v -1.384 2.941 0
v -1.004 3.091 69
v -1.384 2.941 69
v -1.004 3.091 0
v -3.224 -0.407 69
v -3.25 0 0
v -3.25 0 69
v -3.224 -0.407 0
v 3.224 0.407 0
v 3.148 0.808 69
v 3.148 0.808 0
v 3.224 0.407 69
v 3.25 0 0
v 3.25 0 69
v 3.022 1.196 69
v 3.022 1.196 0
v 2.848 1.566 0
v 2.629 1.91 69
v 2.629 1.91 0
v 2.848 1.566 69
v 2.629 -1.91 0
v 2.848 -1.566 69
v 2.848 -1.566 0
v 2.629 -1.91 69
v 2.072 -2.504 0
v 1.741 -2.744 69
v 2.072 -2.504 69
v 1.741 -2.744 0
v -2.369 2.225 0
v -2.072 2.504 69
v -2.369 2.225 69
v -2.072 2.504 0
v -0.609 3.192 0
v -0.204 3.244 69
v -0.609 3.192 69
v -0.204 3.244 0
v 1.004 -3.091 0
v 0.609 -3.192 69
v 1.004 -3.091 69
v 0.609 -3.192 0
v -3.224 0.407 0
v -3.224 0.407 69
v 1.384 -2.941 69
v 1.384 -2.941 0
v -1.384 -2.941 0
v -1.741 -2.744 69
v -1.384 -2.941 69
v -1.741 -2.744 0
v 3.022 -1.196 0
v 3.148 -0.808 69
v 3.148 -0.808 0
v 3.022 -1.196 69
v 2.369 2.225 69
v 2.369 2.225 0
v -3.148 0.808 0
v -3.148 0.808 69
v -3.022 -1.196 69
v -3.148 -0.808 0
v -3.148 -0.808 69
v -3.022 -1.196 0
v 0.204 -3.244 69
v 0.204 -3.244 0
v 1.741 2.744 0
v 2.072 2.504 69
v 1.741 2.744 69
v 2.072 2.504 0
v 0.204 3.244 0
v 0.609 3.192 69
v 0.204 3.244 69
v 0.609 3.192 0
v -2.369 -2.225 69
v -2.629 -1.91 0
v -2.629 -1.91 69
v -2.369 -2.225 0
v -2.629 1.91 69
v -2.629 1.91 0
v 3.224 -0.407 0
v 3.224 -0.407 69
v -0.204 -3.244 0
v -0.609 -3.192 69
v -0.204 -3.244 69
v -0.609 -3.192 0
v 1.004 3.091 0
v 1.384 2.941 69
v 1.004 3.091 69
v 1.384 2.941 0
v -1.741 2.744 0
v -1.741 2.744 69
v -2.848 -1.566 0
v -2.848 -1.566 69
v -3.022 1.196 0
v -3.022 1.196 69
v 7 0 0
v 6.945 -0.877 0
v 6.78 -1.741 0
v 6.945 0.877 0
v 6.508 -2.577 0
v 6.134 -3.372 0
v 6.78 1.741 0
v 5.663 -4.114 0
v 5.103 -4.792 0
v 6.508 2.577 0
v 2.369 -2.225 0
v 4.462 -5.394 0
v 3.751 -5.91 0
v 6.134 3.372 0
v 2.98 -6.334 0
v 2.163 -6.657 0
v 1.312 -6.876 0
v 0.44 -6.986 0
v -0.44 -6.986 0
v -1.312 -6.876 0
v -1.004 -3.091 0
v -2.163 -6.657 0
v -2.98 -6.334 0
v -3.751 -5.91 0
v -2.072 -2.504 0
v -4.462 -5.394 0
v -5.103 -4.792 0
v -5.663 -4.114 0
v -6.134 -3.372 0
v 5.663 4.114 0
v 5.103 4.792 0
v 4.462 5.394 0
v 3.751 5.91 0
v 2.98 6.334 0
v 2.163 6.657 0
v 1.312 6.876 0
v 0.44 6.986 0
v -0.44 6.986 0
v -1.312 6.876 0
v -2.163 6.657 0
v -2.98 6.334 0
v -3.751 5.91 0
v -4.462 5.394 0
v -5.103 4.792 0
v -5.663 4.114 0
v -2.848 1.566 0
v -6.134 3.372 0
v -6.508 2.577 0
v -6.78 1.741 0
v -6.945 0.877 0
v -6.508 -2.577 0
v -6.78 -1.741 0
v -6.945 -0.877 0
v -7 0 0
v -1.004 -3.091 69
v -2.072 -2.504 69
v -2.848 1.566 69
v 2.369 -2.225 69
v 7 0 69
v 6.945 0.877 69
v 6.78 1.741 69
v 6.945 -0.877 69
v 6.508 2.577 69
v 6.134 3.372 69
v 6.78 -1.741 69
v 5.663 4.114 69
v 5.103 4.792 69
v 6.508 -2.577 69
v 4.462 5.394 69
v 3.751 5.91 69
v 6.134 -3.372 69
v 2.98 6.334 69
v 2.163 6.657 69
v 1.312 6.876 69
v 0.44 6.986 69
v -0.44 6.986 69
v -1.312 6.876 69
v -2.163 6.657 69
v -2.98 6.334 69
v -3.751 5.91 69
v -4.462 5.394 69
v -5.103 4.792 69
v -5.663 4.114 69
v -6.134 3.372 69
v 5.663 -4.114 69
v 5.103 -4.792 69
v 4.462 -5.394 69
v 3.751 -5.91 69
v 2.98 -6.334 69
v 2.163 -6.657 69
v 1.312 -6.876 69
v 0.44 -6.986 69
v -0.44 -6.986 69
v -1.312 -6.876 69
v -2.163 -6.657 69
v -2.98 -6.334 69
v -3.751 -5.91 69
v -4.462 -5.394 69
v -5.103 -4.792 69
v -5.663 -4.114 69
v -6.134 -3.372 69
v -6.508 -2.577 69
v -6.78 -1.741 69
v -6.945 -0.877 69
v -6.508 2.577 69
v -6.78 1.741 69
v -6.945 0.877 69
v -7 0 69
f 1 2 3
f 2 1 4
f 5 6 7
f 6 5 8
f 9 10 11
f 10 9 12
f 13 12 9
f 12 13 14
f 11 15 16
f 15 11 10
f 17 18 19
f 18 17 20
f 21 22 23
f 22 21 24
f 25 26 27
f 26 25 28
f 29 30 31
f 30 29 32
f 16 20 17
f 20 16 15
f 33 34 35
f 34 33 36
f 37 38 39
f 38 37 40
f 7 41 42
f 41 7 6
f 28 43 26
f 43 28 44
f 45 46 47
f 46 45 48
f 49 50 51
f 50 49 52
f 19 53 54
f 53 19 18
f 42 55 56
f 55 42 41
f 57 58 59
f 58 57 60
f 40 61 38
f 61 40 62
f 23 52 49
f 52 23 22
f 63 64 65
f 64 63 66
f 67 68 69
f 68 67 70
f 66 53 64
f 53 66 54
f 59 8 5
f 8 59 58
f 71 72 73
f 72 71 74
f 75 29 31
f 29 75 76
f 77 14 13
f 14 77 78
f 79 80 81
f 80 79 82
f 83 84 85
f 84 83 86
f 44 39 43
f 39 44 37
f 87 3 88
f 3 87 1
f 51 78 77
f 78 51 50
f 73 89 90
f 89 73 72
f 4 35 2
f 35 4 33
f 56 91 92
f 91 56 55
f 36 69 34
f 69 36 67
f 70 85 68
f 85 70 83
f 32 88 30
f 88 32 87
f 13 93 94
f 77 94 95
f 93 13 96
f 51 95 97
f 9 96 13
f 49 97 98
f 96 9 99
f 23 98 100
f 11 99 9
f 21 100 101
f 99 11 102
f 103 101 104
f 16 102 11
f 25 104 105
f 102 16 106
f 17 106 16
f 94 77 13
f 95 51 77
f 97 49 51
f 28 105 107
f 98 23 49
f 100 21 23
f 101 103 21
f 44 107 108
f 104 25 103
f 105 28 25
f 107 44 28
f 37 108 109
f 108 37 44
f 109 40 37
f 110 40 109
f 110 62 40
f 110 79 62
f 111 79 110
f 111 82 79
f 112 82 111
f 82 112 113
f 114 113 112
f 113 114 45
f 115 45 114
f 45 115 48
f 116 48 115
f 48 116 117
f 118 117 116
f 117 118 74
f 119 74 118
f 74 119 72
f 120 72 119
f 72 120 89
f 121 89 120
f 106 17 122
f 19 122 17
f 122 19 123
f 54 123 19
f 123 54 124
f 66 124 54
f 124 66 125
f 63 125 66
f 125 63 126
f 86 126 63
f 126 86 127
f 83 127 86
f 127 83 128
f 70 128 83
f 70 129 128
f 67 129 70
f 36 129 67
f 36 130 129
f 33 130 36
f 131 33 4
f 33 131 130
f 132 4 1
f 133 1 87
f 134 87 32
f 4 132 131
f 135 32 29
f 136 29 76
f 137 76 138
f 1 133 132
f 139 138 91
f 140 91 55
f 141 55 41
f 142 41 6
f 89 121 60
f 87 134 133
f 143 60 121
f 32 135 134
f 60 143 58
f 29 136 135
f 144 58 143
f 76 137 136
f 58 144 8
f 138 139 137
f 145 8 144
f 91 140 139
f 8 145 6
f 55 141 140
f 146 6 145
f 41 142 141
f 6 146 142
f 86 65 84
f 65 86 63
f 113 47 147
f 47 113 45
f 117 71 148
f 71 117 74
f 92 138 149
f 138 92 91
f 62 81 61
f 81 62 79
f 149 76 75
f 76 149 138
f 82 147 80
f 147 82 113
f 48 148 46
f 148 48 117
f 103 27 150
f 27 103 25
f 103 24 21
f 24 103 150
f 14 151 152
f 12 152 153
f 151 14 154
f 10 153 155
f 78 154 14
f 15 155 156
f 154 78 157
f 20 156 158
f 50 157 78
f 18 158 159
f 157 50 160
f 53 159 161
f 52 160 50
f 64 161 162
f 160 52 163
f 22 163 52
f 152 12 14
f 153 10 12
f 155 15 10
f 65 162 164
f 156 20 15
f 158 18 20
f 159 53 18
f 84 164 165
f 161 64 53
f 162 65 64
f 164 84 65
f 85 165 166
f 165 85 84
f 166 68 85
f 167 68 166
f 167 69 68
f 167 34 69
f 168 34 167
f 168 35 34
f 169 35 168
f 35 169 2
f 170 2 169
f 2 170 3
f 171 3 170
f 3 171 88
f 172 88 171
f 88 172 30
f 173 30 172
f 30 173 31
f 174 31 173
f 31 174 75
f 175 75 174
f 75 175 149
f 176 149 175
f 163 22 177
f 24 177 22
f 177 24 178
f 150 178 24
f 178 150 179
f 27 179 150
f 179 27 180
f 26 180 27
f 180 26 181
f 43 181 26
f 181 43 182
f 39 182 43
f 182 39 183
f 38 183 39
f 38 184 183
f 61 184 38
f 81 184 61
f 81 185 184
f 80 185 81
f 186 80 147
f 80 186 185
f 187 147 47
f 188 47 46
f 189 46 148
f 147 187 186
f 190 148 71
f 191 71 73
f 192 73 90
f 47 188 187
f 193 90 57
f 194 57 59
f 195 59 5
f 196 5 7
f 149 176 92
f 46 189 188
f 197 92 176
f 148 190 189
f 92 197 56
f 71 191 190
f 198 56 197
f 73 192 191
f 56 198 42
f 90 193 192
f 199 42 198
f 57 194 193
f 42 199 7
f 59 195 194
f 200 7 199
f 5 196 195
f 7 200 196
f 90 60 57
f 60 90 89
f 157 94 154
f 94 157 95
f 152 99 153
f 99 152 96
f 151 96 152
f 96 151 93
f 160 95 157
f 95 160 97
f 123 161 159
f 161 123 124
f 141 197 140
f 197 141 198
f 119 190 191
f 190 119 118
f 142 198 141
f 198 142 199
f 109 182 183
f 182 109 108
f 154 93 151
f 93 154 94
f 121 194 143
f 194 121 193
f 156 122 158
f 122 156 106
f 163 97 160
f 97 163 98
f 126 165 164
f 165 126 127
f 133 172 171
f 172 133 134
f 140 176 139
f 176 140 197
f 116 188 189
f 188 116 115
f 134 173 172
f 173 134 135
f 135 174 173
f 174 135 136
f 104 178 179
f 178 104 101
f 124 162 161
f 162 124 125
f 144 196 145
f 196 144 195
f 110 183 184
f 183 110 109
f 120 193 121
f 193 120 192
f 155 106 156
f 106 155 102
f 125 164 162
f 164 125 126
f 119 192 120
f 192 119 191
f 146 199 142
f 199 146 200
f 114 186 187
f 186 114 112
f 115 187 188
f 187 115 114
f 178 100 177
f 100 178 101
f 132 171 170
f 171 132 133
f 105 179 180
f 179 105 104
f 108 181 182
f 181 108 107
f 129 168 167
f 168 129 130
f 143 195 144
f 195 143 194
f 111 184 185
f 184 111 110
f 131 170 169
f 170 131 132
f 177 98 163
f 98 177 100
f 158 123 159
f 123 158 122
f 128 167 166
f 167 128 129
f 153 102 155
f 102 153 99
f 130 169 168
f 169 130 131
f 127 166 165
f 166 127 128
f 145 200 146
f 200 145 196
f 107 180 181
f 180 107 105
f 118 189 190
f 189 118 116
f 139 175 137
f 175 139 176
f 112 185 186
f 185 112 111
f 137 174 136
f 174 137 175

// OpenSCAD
$fn = 50;


difference() {
	union() {
		cylinder(h = 69, r = 7.0000000000);
	}
	union() {
		cylinder(h = 69, r = 3.2500000000);
		cylinder(h = 69, r = 3.2500000000);
		cylinder(h = 69, r = 1.8000000000);
		cylinder(h = 69, r = 1.8000000000);
		cylinder(h = 69, r = 1.8000000000);
		cylinder(h = 69, r = 1.8000000000);
		cylinder(h = 69, r = 1.8000000000);
		cylinder(h = 69, r = 1.8000000000);
	}
}
